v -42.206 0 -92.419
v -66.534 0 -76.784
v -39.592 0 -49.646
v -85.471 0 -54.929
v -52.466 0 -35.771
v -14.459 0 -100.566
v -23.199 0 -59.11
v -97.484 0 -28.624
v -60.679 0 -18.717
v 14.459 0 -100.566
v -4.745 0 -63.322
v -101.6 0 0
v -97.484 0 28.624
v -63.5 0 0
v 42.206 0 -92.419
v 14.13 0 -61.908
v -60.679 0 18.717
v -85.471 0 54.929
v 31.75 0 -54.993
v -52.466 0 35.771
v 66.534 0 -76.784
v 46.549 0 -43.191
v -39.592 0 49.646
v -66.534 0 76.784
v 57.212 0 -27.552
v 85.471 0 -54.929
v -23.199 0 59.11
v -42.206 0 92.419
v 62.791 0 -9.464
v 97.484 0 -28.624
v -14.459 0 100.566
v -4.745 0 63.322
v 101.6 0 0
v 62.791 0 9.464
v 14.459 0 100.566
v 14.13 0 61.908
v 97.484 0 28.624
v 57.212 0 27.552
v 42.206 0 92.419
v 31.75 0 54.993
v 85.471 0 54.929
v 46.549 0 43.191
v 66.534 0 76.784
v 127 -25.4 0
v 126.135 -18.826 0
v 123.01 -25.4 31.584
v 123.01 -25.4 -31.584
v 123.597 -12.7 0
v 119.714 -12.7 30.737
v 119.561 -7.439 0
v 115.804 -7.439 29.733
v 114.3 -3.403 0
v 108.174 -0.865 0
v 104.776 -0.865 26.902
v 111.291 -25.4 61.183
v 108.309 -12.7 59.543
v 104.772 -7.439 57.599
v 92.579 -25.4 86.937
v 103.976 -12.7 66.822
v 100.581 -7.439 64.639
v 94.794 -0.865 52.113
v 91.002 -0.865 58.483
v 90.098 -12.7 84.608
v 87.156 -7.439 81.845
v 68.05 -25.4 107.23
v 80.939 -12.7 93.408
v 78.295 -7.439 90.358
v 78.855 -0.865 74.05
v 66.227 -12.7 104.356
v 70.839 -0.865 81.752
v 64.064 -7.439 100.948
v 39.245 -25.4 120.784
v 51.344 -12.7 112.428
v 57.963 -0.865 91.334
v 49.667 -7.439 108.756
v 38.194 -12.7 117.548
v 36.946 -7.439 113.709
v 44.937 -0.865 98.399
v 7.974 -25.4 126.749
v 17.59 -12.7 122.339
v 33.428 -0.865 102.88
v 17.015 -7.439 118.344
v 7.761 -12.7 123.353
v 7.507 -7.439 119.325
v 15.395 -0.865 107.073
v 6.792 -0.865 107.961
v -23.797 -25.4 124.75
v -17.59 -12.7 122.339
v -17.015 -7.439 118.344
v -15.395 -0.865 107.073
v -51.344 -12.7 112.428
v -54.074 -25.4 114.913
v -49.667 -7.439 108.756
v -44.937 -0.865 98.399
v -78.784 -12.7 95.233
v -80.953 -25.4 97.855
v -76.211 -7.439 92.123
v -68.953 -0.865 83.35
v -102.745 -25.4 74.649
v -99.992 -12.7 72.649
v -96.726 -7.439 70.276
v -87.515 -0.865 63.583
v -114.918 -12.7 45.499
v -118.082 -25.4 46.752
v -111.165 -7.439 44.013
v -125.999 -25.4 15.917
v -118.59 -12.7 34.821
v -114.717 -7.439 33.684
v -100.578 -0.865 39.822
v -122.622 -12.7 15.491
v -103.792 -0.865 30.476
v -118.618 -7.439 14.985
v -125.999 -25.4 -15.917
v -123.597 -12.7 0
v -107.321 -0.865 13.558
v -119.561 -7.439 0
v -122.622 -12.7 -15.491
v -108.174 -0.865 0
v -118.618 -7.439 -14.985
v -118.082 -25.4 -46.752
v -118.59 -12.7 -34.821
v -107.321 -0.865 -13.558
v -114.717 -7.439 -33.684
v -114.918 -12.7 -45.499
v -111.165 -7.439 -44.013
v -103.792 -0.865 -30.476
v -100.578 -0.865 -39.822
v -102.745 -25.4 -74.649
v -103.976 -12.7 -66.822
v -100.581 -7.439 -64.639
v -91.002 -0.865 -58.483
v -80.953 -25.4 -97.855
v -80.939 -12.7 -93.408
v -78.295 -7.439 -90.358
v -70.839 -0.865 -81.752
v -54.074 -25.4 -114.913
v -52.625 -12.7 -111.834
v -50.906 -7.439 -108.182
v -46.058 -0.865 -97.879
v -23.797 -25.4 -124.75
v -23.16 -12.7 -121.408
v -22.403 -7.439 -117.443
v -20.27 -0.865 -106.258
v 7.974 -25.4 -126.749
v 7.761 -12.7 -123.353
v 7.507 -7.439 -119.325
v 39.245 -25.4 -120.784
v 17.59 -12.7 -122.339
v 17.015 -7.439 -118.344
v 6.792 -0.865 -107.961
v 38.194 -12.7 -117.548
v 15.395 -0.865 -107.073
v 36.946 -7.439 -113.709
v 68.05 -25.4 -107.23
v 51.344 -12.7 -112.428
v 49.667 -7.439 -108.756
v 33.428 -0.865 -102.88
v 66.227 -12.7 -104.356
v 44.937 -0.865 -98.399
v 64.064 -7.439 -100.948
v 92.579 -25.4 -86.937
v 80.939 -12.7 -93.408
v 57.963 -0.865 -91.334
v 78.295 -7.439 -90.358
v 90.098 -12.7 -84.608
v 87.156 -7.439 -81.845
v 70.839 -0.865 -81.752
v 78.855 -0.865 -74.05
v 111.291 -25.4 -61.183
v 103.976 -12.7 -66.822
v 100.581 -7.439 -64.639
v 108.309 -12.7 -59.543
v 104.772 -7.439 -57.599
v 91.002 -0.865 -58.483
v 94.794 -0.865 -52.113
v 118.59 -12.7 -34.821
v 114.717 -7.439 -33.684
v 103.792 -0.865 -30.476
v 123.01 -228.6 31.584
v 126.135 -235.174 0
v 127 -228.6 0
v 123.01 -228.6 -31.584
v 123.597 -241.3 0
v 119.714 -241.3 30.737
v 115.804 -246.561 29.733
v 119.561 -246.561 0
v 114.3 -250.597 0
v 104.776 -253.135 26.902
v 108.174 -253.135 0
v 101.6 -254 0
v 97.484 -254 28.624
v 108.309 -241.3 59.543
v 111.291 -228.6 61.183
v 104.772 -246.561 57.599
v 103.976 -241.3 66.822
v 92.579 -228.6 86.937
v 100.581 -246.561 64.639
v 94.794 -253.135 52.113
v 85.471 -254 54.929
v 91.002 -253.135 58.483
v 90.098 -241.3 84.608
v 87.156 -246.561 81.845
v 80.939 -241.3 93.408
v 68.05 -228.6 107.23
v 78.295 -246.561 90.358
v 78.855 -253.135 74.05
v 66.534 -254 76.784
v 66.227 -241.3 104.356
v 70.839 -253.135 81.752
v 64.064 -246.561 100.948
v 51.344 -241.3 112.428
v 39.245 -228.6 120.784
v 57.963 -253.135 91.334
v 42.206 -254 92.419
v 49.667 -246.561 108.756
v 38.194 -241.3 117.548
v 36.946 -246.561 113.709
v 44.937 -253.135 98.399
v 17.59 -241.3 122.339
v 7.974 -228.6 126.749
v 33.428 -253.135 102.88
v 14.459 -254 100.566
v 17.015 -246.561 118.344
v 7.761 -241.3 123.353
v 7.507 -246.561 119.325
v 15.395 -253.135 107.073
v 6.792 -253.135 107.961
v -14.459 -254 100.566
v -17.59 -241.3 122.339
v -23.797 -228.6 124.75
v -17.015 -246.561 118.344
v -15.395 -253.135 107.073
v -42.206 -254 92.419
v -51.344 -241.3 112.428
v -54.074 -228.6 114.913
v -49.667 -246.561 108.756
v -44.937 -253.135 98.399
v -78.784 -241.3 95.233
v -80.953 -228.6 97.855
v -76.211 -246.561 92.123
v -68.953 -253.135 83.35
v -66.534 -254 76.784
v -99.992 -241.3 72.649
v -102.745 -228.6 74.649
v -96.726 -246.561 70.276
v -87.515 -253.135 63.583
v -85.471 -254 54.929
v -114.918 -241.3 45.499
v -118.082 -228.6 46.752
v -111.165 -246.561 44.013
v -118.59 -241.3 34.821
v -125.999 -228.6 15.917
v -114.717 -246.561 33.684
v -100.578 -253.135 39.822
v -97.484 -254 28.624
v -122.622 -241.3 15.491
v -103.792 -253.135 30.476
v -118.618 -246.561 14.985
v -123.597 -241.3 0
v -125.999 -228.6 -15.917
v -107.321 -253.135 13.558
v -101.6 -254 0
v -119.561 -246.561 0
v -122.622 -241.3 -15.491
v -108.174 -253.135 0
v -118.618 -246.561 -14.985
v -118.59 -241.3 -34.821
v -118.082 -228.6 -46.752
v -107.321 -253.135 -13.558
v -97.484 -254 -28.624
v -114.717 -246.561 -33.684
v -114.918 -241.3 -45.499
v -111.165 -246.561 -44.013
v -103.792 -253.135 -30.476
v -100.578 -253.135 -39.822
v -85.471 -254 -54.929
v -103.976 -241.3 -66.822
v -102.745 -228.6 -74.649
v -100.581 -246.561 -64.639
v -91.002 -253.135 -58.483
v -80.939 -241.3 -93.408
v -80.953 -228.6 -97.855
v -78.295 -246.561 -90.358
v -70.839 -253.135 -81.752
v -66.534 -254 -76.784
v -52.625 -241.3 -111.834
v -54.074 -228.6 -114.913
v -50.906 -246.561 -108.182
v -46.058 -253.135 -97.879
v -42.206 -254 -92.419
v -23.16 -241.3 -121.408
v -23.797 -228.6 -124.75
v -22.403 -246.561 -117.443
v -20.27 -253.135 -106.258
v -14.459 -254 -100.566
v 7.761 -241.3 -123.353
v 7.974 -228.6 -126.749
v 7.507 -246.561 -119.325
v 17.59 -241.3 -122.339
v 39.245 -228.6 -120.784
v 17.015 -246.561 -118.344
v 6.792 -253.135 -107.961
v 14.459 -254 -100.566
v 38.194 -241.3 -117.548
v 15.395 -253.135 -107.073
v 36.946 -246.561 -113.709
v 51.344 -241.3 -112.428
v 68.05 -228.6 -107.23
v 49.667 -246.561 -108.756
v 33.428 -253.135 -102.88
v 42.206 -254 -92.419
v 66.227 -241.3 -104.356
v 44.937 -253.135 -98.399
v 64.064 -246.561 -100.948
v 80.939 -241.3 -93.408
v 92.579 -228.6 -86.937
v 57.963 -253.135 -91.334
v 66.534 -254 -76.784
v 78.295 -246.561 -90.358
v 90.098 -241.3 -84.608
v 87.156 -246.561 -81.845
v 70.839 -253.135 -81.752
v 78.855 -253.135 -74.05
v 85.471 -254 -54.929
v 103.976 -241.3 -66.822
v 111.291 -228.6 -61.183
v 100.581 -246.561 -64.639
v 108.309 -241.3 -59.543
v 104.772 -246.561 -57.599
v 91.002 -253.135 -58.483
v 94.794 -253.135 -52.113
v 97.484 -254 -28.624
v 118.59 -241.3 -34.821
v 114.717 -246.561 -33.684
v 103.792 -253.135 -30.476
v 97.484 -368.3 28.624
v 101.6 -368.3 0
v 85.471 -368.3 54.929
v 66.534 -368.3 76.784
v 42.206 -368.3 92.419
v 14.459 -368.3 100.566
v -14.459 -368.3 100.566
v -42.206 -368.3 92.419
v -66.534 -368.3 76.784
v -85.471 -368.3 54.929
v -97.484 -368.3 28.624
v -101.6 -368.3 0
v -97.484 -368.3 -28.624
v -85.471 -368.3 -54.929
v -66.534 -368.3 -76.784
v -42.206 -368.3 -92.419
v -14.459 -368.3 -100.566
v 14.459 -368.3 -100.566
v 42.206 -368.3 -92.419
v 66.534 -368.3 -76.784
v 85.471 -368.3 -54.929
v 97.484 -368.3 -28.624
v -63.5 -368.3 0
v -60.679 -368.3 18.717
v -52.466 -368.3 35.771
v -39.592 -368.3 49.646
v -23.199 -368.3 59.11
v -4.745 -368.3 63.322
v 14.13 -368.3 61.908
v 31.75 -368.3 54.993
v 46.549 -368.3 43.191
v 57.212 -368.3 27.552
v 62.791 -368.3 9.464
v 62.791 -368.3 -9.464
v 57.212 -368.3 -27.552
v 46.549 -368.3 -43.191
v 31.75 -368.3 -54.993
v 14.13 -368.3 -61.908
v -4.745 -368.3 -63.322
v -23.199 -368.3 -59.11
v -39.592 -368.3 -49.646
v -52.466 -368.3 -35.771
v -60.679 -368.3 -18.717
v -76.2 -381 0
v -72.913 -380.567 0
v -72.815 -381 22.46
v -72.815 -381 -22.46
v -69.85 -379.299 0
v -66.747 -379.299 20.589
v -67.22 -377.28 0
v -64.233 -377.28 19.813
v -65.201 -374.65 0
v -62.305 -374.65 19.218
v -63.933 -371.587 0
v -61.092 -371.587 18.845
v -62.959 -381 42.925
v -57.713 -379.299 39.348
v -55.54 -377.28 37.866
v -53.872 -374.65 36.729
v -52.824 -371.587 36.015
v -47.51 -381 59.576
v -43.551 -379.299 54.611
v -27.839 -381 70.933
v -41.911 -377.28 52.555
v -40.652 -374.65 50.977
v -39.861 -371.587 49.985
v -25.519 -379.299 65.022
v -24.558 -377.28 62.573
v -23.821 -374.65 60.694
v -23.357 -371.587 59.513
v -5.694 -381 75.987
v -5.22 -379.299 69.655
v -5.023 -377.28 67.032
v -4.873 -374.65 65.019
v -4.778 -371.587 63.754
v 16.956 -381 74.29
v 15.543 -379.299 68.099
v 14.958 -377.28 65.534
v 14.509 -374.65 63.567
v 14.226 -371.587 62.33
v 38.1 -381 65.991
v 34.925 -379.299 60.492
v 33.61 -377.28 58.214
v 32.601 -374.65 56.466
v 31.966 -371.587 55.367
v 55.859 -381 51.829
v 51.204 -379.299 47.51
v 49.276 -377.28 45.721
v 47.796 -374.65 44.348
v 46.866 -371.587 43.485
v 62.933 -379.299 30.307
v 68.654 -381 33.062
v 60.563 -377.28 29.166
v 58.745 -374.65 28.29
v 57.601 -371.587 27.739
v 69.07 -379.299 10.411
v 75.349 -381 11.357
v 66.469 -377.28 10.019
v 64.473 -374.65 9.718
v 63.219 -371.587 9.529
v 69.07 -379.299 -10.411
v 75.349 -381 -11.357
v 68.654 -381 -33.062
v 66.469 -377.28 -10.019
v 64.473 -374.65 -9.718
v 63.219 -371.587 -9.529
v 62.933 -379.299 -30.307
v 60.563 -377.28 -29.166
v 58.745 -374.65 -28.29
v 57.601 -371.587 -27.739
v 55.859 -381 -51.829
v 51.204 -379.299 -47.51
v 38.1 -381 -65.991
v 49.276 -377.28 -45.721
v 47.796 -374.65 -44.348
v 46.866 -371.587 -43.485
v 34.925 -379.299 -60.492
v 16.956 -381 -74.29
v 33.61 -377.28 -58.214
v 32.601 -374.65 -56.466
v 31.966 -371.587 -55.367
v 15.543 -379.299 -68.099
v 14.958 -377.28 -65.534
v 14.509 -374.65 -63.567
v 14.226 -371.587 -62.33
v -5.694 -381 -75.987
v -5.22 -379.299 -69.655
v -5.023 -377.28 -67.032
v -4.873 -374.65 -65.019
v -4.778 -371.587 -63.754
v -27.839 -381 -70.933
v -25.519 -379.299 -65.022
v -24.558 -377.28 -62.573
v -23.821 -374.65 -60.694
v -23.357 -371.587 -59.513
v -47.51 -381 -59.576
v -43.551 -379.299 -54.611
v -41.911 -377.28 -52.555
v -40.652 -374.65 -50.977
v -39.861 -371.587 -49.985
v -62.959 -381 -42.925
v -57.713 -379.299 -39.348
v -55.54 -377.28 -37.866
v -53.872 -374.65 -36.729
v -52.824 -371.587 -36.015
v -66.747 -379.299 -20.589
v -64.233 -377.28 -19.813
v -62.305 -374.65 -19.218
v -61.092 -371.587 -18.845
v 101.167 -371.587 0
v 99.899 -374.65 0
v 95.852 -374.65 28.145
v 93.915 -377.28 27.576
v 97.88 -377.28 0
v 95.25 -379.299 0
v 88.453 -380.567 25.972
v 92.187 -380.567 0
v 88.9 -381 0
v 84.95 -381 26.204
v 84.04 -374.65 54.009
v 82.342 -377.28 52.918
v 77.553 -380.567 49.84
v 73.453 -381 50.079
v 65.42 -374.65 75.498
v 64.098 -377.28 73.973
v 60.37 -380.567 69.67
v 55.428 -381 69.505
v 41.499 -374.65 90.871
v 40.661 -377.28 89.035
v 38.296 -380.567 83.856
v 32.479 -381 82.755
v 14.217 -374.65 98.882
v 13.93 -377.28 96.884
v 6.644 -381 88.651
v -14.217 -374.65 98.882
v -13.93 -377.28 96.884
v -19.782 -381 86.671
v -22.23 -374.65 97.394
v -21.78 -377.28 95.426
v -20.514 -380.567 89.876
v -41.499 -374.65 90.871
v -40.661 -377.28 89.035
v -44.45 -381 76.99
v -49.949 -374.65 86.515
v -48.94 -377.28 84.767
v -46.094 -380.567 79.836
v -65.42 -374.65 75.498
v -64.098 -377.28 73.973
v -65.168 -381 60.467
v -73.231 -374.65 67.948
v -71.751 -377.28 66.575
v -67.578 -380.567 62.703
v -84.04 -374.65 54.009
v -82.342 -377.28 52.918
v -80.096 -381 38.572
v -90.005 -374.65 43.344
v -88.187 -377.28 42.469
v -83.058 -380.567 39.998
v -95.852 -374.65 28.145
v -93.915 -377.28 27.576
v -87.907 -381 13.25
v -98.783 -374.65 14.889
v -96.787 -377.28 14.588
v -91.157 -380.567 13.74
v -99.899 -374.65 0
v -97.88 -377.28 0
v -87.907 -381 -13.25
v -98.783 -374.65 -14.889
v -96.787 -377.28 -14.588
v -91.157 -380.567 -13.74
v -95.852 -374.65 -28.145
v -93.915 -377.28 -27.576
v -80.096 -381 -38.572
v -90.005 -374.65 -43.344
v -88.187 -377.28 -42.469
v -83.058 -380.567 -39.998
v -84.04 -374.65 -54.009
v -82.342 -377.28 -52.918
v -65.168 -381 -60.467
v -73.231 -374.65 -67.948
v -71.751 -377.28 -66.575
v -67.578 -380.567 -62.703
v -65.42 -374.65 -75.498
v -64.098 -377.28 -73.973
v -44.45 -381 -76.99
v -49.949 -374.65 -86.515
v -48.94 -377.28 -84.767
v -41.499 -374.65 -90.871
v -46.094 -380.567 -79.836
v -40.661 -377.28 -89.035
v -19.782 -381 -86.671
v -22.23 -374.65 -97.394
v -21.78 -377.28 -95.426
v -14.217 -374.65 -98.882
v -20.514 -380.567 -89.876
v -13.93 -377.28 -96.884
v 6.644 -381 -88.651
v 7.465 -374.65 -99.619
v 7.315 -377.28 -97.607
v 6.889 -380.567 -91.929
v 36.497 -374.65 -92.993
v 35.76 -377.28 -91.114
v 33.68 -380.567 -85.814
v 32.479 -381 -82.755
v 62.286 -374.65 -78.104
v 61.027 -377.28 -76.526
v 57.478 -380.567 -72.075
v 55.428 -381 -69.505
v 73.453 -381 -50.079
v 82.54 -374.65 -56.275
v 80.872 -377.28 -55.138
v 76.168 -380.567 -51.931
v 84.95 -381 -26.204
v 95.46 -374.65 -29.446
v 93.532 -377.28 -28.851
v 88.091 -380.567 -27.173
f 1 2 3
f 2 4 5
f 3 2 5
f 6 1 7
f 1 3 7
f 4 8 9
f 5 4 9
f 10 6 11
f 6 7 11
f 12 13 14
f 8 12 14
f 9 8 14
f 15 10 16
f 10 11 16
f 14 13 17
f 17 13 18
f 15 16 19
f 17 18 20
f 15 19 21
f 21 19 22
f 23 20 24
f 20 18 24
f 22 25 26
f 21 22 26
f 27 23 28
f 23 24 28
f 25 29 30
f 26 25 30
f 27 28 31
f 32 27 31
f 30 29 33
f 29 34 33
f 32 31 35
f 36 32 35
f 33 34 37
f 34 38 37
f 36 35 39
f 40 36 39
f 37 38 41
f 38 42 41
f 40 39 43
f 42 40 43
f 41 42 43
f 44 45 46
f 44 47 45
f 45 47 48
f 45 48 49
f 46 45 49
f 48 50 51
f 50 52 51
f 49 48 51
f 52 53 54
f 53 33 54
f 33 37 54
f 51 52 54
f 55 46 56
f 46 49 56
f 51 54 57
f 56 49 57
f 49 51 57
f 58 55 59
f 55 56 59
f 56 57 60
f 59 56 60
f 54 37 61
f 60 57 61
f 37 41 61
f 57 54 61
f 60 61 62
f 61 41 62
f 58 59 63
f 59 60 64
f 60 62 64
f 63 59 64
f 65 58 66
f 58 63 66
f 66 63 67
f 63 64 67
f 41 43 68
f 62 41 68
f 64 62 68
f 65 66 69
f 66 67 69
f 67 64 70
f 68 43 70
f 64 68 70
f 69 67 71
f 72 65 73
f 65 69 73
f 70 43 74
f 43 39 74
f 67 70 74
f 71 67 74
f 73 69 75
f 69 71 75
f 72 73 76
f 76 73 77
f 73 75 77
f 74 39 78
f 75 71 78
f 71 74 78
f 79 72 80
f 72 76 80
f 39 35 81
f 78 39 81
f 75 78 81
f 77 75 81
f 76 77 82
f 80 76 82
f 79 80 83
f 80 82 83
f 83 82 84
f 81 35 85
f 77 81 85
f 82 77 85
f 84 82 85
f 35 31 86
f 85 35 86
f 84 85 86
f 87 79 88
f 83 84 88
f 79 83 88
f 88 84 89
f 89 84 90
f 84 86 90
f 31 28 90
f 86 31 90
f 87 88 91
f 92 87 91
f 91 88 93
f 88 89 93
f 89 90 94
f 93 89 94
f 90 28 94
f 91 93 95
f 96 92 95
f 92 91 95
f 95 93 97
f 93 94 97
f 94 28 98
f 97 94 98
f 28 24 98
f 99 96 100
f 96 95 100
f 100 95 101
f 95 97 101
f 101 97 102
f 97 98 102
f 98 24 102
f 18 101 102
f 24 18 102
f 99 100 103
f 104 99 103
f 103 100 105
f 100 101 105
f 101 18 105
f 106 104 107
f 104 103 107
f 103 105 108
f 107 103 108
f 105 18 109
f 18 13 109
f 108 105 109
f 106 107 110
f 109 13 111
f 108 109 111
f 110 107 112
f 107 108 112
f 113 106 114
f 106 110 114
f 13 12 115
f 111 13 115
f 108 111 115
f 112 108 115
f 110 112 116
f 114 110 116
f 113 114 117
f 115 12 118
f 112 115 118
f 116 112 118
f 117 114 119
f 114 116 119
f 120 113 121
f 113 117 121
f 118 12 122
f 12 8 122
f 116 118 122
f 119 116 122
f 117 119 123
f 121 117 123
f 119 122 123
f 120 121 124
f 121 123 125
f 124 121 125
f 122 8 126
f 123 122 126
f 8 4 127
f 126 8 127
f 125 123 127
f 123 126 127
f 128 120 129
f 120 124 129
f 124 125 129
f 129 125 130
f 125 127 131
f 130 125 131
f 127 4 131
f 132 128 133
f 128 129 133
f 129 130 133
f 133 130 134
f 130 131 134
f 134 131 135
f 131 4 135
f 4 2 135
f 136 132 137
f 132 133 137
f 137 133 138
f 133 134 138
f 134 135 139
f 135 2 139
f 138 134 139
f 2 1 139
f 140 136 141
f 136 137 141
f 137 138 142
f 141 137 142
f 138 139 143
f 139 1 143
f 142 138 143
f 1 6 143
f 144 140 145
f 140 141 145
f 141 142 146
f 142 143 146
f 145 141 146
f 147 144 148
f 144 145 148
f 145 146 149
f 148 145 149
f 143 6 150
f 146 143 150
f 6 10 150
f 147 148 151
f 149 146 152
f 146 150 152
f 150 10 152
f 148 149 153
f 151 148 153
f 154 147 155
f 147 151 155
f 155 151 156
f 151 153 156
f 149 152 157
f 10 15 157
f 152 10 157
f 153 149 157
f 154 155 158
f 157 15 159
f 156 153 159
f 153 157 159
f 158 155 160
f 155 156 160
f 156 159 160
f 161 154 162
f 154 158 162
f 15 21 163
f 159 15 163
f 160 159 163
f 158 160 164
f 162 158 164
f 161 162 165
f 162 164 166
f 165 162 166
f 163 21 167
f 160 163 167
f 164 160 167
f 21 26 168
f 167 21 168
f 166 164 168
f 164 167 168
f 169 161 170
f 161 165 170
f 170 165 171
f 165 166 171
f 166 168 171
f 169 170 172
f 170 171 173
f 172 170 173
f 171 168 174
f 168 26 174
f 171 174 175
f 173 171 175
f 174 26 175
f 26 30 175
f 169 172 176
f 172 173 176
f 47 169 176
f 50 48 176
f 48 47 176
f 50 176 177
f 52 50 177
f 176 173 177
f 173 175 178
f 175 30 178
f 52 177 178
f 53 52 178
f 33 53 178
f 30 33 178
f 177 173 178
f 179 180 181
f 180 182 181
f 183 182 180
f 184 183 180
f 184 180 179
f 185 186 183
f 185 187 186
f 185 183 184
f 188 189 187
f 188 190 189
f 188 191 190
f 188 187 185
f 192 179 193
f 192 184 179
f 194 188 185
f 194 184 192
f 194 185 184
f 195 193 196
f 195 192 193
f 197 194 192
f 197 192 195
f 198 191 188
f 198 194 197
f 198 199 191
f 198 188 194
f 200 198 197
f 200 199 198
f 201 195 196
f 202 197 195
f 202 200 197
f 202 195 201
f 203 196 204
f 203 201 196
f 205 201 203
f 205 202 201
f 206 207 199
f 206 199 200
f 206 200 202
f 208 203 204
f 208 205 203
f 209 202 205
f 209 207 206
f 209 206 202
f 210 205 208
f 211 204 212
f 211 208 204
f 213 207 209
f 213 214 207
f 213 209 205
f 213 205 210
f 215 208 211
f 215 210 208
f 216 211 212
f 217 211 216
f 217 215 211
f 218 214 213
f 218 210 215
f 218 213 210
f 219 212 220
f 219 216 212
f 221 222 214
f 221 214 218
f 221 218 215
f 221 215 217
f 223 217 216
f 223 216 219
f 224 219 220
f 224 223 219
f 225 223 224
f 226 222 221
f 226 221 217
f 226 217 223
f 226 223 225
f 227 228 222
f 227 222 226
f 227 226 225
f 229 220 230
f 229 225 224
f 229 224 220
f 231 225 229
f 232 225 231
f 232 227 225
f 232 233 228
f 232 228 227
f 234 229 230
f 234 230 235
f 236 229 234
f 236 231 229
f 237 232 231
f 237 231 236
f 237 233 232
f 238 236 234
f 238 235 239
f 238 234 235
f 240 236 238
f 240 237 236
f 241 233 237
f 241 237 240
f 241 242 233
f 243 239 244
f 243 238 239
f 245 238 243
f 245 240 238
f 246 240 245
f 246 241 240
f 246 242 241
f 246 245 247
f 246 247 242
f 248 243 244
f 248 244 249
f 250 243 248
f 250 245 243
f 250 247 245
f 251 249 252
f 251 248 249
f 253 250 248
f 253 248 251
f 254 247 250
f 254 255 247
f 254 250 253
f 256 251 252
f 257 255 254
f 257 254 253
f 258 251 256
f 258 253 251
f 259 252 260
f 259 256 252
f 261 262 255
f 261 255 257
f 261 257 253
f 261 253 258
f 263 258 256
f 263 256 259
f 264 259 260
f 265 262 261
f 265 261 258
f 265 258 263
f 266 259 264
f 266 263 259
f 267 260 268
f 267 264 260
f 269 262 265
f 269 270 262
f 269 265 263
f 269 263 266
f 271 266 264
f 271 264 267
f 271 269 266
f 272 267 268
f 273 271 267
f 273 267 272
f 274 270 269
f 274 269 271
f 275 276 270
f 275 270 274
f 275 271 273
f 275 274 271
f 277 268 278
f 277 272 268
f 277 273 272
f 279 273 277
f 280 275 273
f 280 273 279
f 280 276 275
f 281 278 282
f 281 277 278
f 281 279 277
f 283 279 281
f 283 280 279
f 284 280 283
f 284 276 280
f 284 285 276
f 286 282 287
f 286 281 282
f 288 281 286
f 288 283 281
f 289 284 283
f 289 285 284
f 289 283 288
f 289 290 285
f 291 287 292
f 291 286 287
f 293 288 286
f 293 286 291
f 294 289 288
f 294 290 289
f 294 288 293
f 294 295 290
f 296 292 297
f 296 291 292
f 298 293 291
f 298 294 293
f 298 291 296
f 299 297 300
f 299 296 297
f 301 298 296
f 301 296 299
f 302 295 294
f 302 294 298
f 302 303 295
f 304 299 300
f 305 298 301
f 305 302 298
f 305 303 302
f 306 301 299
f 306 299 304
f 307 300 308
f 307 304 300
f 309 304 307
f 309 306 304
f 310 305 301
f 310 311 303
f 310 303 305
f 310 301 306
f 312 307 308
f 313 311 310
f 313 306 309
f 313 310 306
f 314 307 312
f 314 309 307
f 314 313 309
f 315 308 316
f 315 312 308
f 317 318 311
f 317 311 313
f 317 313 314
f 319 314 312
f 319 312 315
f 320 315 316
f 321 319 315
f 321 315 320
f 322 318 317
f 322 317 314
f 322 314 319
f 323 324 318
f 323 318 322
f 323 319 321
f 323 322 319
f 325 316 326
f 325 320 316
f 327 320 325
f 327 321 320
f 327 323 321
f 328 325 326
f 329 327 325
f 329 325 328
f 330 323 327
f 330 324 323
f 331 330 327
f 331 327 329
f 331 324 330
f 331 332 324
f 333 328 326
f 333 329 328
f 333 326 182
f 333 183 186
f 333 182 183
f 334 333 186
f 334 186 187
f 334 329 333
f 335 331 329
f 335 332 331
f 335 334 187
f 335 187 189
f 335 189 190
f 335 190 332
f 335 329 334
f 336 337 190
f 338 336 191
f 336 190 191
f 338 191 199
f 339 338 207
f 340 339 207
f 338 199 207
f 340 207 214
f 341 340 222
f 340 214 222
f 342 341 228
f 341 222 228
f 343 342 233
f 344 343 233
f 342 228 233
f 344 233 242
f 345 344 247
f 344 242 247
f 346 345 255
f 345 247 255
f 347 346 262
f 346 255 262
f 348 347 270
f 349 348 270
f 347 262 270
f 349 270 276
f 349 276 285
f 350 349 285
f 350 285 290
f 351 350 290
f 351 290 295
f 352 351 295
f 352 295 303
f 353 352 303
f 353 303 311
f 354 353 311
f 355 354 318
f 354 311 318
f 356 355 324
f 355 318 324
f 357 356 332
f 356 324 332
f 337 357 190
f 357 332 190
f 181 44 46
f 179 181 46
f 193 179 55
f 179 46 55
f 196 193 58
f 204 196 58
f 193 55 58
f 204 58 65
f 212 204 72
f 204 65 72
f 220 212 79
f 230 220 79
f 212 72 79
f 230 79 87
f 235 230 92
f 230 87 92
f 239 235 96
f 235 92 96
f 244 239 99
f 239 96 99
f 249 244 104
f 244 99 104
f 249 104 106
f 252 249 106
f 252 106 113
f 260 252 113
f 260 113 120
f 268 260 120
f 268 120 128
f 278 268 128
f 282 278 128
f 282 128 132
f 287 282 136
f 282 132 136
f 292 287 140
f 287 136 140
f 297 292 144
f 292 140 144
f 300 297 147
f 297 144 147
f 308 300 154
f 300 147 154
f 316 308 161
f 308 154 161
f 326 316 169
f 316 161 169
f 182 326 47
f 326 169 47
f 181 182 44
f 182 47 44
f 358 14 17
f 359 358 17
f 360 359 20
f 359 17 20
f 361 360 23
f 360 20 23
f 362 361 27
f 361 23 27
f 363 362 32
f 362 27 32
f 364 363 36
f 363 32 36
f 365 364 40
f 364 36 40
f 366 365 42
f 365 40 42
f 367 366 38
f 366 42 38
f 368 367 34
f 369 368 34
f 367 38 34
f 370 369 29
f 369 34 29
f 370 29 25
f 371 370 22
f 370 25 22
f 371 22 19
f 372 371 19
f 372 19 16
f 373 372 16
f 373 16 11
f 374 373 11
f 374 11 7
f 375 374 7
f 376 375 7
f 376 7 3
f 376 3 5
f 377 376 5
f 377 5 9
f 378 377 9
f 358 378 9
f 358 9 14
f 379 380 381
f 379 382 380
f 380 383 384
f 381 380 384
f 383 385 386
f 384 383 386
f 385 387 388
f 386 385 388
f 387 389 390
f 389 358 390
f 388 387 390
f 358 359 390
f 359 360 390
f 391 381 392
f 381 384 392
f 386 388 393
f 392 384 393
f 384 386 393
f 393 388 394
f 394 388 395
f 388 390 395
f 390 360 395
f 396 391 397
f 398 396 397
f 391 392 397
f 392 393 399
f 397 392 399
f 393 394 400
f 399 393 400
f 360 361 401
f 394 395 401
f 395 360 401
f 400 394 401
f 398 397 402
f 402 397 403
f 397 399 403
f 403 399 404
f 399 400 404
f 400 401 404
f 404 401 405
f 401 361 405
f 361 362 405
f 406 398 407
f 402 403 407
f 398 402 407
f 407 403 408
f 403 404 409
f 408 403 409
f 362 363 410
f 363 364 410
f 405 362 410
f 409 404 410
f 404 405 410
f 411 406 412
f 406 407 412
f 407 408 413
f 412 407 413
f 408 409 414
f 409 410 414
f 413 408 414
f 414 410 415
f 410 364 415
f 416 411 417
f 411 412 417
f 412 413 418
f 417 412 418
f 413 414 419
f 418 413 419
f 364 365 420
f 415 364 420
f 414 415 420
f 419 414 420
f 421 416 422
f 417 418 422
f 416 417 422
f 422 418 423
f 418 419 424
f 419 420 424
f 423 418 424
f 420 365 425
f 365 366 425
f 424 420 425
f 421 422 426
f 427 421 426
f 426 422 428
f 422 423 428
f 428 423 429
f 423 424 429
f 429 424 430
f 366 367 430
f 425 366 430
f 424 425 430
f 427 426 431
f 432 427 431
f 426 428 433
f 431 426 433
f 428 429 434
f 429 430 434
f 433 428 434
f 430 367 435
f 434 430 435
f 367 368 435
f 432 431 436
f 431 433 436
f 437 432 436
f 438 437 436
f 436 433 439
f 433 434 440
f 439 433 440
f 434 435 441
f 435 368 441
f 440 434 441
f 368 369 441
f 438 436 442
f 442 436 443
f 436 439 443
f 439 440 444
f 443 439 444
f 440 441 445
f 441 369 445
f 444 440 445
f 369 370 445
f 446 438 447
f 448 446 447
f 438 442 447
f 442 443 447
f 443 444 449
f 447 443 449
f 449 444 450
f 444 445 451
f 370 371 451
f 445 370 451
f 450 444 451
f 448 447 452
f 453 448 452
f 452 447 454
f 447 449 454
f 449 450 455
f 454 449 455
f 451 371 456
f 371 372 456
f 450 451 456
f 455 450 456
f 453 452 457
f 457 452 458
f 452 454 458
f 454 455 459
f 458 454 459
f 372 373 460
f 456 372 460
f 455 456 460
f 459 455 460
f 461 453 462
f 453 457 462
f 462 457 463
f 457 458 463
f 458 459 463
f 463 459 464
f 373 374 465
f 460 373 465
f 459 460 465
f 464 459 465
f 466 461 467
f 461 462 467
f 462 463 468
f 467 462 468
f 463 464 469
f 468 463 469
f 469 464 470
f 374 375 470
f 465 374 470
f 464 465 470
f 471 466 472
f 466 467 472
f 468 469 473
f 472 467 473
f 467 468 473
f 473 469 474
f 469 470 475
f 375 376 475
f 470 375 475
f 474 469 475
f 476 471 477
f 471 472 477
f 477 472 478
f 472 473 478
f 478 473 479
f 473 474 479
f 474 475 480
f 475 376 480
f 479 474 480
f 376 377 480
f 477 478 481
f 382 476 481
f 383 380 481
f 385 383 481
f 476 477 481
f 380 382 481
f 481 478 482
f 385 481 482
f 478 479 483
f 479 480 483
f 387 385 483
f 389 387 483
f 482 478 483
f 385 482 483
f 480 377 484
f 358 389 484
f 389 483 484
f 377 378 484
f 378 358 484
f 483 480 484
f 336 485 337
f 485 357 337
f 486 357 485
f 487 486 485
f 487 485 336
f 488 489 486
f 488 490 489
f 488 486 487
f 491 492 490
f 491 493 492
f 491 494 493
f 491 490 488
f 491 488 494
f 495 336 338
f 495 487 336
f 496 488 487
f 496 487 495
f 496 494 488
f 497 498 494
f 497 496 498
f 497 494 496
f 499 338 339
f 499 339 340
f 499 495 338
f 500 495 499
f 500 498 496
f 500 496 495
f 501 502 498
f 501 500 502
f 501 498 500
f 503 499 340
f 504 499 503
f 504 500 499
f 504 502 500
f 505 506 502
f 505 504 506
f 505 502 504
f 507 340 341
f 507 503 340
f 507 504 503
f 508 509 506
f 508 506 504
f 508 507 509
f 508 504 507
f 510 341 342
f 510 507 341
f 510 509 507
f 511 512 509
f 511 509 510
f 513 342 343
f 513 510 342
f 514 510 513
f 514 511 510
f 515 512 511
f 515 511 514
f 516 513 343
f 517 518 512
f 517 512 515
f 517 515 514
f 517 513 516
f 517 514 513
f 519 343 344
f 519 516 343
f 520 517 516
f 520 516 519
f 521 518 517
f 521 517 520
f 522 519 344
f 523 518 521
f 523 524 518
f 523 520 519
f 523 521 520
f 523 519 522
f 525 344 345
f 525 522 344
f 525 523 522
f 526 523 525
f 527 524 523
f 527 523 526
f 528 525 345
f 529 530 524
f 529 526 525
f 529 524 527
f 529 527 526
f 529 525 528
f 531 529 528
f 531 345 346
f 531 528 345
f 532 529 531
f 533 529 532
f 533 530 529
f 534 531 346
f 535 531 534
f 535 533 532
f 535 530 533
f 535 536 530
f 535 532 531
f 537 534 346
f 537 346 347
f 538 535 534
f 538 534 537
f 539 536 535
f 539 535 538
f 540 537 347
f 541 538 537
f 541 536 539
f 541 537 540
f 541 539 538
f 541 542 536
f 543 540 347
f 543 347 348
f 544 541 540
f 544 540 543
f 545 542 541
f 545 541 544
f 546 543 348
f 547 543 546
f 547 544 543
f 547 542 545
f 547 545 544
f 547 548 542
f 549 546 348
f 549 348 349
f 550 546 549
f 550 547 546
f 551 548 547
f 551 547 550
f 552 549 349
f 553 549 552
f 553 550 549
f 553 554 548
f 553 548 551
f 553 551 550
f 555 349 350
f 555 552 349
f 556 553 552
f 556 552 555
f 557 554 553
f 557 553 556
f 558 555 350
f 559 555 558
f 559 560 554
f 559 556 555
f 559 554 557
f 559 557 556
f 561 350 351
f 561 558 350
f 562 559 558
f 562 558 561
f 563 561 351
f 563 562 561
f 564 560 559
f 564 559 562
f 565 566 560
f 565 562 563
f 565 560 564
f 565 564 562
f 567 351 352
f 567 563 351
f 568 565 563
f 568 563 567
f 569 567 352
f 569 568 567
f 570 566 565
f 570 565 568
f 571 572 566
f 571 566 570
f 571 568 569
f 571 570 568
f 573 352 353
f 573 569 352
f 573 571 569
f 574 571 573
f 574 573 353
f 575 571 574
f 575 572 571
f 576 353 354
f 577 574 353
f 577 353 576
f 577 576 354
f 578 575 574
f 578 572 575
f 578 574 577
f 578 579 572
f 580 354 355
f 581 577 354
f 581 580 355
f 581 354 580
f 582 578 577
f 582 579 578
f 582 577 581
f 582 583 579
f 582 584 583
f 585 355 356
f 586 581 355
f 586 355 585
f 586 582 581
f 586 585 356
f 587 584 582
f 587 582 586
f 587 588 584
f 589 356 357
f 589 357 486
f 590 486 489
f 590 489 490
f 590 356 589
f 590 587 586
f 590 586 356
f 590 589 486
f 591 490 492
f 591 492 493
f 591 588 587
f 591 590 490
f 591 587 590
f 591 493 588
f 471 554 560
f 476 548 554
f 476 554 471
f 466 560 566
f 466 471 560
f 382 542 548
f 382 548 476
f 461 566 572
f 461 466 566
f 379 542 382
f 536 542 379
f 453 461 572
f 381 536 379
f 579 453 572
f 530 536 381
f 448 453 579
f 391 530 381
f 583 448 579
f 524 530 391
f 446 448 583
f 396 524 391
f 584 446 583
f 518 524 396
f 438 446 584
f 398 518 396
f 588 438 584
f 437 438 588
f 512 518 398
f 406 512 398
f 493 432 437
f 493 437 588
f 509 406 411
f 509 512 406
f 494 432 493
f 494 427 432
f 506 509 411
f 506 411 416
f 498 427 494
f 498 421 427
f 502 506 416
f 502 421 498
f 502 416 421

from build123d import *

# Parameters (mm, degrees)
F0_R     = 127
F1_DEPTH = 254
F2_R     = 25.4
F4_D     = 127
F5_DEPTH = 127
F6_R     = 12.7


# Not quite as in the source:
# - a feature names something its author has since deleted; it is built from what else it names


with BuildPart() as f1:
    # F0 (on Front) → F1 (new body)
    with BuildSketch(Plane.XZ):
        Circle(F0_R)
    extrude(amount=F1_DEPTH)

    # F2
    f2_edges = [f1.edges().sort_by_distance(p)[0] for p in [
        (-127, -254, 0),
        (-127, 0, 0),
    ]]
    fillet(f2_edges, radius=F2_R)

    # F4 (through all)
    with Locations(Plane.XZ.offset(254)):
        with Locations((0, 0)):
            Hole(F4_D / 2)

    # F5 (add): a face of the model
    f5_faces = [f1.faces().sort_by_distance(p)[0] for p in [
        (-98.7263180413, -254, 0),
    ]]
    extrude(f5_faces, amount=F5_DEPTH)

    # F6
    f6_edges = [f1.edges().sort_by_distance(p)[0] for p in [
        (-101.6, -381, 0),
        (-63.5, -381, 0),
    ]]
    fillet(f6_edges, radius=F6_R)


solid = f1.part
